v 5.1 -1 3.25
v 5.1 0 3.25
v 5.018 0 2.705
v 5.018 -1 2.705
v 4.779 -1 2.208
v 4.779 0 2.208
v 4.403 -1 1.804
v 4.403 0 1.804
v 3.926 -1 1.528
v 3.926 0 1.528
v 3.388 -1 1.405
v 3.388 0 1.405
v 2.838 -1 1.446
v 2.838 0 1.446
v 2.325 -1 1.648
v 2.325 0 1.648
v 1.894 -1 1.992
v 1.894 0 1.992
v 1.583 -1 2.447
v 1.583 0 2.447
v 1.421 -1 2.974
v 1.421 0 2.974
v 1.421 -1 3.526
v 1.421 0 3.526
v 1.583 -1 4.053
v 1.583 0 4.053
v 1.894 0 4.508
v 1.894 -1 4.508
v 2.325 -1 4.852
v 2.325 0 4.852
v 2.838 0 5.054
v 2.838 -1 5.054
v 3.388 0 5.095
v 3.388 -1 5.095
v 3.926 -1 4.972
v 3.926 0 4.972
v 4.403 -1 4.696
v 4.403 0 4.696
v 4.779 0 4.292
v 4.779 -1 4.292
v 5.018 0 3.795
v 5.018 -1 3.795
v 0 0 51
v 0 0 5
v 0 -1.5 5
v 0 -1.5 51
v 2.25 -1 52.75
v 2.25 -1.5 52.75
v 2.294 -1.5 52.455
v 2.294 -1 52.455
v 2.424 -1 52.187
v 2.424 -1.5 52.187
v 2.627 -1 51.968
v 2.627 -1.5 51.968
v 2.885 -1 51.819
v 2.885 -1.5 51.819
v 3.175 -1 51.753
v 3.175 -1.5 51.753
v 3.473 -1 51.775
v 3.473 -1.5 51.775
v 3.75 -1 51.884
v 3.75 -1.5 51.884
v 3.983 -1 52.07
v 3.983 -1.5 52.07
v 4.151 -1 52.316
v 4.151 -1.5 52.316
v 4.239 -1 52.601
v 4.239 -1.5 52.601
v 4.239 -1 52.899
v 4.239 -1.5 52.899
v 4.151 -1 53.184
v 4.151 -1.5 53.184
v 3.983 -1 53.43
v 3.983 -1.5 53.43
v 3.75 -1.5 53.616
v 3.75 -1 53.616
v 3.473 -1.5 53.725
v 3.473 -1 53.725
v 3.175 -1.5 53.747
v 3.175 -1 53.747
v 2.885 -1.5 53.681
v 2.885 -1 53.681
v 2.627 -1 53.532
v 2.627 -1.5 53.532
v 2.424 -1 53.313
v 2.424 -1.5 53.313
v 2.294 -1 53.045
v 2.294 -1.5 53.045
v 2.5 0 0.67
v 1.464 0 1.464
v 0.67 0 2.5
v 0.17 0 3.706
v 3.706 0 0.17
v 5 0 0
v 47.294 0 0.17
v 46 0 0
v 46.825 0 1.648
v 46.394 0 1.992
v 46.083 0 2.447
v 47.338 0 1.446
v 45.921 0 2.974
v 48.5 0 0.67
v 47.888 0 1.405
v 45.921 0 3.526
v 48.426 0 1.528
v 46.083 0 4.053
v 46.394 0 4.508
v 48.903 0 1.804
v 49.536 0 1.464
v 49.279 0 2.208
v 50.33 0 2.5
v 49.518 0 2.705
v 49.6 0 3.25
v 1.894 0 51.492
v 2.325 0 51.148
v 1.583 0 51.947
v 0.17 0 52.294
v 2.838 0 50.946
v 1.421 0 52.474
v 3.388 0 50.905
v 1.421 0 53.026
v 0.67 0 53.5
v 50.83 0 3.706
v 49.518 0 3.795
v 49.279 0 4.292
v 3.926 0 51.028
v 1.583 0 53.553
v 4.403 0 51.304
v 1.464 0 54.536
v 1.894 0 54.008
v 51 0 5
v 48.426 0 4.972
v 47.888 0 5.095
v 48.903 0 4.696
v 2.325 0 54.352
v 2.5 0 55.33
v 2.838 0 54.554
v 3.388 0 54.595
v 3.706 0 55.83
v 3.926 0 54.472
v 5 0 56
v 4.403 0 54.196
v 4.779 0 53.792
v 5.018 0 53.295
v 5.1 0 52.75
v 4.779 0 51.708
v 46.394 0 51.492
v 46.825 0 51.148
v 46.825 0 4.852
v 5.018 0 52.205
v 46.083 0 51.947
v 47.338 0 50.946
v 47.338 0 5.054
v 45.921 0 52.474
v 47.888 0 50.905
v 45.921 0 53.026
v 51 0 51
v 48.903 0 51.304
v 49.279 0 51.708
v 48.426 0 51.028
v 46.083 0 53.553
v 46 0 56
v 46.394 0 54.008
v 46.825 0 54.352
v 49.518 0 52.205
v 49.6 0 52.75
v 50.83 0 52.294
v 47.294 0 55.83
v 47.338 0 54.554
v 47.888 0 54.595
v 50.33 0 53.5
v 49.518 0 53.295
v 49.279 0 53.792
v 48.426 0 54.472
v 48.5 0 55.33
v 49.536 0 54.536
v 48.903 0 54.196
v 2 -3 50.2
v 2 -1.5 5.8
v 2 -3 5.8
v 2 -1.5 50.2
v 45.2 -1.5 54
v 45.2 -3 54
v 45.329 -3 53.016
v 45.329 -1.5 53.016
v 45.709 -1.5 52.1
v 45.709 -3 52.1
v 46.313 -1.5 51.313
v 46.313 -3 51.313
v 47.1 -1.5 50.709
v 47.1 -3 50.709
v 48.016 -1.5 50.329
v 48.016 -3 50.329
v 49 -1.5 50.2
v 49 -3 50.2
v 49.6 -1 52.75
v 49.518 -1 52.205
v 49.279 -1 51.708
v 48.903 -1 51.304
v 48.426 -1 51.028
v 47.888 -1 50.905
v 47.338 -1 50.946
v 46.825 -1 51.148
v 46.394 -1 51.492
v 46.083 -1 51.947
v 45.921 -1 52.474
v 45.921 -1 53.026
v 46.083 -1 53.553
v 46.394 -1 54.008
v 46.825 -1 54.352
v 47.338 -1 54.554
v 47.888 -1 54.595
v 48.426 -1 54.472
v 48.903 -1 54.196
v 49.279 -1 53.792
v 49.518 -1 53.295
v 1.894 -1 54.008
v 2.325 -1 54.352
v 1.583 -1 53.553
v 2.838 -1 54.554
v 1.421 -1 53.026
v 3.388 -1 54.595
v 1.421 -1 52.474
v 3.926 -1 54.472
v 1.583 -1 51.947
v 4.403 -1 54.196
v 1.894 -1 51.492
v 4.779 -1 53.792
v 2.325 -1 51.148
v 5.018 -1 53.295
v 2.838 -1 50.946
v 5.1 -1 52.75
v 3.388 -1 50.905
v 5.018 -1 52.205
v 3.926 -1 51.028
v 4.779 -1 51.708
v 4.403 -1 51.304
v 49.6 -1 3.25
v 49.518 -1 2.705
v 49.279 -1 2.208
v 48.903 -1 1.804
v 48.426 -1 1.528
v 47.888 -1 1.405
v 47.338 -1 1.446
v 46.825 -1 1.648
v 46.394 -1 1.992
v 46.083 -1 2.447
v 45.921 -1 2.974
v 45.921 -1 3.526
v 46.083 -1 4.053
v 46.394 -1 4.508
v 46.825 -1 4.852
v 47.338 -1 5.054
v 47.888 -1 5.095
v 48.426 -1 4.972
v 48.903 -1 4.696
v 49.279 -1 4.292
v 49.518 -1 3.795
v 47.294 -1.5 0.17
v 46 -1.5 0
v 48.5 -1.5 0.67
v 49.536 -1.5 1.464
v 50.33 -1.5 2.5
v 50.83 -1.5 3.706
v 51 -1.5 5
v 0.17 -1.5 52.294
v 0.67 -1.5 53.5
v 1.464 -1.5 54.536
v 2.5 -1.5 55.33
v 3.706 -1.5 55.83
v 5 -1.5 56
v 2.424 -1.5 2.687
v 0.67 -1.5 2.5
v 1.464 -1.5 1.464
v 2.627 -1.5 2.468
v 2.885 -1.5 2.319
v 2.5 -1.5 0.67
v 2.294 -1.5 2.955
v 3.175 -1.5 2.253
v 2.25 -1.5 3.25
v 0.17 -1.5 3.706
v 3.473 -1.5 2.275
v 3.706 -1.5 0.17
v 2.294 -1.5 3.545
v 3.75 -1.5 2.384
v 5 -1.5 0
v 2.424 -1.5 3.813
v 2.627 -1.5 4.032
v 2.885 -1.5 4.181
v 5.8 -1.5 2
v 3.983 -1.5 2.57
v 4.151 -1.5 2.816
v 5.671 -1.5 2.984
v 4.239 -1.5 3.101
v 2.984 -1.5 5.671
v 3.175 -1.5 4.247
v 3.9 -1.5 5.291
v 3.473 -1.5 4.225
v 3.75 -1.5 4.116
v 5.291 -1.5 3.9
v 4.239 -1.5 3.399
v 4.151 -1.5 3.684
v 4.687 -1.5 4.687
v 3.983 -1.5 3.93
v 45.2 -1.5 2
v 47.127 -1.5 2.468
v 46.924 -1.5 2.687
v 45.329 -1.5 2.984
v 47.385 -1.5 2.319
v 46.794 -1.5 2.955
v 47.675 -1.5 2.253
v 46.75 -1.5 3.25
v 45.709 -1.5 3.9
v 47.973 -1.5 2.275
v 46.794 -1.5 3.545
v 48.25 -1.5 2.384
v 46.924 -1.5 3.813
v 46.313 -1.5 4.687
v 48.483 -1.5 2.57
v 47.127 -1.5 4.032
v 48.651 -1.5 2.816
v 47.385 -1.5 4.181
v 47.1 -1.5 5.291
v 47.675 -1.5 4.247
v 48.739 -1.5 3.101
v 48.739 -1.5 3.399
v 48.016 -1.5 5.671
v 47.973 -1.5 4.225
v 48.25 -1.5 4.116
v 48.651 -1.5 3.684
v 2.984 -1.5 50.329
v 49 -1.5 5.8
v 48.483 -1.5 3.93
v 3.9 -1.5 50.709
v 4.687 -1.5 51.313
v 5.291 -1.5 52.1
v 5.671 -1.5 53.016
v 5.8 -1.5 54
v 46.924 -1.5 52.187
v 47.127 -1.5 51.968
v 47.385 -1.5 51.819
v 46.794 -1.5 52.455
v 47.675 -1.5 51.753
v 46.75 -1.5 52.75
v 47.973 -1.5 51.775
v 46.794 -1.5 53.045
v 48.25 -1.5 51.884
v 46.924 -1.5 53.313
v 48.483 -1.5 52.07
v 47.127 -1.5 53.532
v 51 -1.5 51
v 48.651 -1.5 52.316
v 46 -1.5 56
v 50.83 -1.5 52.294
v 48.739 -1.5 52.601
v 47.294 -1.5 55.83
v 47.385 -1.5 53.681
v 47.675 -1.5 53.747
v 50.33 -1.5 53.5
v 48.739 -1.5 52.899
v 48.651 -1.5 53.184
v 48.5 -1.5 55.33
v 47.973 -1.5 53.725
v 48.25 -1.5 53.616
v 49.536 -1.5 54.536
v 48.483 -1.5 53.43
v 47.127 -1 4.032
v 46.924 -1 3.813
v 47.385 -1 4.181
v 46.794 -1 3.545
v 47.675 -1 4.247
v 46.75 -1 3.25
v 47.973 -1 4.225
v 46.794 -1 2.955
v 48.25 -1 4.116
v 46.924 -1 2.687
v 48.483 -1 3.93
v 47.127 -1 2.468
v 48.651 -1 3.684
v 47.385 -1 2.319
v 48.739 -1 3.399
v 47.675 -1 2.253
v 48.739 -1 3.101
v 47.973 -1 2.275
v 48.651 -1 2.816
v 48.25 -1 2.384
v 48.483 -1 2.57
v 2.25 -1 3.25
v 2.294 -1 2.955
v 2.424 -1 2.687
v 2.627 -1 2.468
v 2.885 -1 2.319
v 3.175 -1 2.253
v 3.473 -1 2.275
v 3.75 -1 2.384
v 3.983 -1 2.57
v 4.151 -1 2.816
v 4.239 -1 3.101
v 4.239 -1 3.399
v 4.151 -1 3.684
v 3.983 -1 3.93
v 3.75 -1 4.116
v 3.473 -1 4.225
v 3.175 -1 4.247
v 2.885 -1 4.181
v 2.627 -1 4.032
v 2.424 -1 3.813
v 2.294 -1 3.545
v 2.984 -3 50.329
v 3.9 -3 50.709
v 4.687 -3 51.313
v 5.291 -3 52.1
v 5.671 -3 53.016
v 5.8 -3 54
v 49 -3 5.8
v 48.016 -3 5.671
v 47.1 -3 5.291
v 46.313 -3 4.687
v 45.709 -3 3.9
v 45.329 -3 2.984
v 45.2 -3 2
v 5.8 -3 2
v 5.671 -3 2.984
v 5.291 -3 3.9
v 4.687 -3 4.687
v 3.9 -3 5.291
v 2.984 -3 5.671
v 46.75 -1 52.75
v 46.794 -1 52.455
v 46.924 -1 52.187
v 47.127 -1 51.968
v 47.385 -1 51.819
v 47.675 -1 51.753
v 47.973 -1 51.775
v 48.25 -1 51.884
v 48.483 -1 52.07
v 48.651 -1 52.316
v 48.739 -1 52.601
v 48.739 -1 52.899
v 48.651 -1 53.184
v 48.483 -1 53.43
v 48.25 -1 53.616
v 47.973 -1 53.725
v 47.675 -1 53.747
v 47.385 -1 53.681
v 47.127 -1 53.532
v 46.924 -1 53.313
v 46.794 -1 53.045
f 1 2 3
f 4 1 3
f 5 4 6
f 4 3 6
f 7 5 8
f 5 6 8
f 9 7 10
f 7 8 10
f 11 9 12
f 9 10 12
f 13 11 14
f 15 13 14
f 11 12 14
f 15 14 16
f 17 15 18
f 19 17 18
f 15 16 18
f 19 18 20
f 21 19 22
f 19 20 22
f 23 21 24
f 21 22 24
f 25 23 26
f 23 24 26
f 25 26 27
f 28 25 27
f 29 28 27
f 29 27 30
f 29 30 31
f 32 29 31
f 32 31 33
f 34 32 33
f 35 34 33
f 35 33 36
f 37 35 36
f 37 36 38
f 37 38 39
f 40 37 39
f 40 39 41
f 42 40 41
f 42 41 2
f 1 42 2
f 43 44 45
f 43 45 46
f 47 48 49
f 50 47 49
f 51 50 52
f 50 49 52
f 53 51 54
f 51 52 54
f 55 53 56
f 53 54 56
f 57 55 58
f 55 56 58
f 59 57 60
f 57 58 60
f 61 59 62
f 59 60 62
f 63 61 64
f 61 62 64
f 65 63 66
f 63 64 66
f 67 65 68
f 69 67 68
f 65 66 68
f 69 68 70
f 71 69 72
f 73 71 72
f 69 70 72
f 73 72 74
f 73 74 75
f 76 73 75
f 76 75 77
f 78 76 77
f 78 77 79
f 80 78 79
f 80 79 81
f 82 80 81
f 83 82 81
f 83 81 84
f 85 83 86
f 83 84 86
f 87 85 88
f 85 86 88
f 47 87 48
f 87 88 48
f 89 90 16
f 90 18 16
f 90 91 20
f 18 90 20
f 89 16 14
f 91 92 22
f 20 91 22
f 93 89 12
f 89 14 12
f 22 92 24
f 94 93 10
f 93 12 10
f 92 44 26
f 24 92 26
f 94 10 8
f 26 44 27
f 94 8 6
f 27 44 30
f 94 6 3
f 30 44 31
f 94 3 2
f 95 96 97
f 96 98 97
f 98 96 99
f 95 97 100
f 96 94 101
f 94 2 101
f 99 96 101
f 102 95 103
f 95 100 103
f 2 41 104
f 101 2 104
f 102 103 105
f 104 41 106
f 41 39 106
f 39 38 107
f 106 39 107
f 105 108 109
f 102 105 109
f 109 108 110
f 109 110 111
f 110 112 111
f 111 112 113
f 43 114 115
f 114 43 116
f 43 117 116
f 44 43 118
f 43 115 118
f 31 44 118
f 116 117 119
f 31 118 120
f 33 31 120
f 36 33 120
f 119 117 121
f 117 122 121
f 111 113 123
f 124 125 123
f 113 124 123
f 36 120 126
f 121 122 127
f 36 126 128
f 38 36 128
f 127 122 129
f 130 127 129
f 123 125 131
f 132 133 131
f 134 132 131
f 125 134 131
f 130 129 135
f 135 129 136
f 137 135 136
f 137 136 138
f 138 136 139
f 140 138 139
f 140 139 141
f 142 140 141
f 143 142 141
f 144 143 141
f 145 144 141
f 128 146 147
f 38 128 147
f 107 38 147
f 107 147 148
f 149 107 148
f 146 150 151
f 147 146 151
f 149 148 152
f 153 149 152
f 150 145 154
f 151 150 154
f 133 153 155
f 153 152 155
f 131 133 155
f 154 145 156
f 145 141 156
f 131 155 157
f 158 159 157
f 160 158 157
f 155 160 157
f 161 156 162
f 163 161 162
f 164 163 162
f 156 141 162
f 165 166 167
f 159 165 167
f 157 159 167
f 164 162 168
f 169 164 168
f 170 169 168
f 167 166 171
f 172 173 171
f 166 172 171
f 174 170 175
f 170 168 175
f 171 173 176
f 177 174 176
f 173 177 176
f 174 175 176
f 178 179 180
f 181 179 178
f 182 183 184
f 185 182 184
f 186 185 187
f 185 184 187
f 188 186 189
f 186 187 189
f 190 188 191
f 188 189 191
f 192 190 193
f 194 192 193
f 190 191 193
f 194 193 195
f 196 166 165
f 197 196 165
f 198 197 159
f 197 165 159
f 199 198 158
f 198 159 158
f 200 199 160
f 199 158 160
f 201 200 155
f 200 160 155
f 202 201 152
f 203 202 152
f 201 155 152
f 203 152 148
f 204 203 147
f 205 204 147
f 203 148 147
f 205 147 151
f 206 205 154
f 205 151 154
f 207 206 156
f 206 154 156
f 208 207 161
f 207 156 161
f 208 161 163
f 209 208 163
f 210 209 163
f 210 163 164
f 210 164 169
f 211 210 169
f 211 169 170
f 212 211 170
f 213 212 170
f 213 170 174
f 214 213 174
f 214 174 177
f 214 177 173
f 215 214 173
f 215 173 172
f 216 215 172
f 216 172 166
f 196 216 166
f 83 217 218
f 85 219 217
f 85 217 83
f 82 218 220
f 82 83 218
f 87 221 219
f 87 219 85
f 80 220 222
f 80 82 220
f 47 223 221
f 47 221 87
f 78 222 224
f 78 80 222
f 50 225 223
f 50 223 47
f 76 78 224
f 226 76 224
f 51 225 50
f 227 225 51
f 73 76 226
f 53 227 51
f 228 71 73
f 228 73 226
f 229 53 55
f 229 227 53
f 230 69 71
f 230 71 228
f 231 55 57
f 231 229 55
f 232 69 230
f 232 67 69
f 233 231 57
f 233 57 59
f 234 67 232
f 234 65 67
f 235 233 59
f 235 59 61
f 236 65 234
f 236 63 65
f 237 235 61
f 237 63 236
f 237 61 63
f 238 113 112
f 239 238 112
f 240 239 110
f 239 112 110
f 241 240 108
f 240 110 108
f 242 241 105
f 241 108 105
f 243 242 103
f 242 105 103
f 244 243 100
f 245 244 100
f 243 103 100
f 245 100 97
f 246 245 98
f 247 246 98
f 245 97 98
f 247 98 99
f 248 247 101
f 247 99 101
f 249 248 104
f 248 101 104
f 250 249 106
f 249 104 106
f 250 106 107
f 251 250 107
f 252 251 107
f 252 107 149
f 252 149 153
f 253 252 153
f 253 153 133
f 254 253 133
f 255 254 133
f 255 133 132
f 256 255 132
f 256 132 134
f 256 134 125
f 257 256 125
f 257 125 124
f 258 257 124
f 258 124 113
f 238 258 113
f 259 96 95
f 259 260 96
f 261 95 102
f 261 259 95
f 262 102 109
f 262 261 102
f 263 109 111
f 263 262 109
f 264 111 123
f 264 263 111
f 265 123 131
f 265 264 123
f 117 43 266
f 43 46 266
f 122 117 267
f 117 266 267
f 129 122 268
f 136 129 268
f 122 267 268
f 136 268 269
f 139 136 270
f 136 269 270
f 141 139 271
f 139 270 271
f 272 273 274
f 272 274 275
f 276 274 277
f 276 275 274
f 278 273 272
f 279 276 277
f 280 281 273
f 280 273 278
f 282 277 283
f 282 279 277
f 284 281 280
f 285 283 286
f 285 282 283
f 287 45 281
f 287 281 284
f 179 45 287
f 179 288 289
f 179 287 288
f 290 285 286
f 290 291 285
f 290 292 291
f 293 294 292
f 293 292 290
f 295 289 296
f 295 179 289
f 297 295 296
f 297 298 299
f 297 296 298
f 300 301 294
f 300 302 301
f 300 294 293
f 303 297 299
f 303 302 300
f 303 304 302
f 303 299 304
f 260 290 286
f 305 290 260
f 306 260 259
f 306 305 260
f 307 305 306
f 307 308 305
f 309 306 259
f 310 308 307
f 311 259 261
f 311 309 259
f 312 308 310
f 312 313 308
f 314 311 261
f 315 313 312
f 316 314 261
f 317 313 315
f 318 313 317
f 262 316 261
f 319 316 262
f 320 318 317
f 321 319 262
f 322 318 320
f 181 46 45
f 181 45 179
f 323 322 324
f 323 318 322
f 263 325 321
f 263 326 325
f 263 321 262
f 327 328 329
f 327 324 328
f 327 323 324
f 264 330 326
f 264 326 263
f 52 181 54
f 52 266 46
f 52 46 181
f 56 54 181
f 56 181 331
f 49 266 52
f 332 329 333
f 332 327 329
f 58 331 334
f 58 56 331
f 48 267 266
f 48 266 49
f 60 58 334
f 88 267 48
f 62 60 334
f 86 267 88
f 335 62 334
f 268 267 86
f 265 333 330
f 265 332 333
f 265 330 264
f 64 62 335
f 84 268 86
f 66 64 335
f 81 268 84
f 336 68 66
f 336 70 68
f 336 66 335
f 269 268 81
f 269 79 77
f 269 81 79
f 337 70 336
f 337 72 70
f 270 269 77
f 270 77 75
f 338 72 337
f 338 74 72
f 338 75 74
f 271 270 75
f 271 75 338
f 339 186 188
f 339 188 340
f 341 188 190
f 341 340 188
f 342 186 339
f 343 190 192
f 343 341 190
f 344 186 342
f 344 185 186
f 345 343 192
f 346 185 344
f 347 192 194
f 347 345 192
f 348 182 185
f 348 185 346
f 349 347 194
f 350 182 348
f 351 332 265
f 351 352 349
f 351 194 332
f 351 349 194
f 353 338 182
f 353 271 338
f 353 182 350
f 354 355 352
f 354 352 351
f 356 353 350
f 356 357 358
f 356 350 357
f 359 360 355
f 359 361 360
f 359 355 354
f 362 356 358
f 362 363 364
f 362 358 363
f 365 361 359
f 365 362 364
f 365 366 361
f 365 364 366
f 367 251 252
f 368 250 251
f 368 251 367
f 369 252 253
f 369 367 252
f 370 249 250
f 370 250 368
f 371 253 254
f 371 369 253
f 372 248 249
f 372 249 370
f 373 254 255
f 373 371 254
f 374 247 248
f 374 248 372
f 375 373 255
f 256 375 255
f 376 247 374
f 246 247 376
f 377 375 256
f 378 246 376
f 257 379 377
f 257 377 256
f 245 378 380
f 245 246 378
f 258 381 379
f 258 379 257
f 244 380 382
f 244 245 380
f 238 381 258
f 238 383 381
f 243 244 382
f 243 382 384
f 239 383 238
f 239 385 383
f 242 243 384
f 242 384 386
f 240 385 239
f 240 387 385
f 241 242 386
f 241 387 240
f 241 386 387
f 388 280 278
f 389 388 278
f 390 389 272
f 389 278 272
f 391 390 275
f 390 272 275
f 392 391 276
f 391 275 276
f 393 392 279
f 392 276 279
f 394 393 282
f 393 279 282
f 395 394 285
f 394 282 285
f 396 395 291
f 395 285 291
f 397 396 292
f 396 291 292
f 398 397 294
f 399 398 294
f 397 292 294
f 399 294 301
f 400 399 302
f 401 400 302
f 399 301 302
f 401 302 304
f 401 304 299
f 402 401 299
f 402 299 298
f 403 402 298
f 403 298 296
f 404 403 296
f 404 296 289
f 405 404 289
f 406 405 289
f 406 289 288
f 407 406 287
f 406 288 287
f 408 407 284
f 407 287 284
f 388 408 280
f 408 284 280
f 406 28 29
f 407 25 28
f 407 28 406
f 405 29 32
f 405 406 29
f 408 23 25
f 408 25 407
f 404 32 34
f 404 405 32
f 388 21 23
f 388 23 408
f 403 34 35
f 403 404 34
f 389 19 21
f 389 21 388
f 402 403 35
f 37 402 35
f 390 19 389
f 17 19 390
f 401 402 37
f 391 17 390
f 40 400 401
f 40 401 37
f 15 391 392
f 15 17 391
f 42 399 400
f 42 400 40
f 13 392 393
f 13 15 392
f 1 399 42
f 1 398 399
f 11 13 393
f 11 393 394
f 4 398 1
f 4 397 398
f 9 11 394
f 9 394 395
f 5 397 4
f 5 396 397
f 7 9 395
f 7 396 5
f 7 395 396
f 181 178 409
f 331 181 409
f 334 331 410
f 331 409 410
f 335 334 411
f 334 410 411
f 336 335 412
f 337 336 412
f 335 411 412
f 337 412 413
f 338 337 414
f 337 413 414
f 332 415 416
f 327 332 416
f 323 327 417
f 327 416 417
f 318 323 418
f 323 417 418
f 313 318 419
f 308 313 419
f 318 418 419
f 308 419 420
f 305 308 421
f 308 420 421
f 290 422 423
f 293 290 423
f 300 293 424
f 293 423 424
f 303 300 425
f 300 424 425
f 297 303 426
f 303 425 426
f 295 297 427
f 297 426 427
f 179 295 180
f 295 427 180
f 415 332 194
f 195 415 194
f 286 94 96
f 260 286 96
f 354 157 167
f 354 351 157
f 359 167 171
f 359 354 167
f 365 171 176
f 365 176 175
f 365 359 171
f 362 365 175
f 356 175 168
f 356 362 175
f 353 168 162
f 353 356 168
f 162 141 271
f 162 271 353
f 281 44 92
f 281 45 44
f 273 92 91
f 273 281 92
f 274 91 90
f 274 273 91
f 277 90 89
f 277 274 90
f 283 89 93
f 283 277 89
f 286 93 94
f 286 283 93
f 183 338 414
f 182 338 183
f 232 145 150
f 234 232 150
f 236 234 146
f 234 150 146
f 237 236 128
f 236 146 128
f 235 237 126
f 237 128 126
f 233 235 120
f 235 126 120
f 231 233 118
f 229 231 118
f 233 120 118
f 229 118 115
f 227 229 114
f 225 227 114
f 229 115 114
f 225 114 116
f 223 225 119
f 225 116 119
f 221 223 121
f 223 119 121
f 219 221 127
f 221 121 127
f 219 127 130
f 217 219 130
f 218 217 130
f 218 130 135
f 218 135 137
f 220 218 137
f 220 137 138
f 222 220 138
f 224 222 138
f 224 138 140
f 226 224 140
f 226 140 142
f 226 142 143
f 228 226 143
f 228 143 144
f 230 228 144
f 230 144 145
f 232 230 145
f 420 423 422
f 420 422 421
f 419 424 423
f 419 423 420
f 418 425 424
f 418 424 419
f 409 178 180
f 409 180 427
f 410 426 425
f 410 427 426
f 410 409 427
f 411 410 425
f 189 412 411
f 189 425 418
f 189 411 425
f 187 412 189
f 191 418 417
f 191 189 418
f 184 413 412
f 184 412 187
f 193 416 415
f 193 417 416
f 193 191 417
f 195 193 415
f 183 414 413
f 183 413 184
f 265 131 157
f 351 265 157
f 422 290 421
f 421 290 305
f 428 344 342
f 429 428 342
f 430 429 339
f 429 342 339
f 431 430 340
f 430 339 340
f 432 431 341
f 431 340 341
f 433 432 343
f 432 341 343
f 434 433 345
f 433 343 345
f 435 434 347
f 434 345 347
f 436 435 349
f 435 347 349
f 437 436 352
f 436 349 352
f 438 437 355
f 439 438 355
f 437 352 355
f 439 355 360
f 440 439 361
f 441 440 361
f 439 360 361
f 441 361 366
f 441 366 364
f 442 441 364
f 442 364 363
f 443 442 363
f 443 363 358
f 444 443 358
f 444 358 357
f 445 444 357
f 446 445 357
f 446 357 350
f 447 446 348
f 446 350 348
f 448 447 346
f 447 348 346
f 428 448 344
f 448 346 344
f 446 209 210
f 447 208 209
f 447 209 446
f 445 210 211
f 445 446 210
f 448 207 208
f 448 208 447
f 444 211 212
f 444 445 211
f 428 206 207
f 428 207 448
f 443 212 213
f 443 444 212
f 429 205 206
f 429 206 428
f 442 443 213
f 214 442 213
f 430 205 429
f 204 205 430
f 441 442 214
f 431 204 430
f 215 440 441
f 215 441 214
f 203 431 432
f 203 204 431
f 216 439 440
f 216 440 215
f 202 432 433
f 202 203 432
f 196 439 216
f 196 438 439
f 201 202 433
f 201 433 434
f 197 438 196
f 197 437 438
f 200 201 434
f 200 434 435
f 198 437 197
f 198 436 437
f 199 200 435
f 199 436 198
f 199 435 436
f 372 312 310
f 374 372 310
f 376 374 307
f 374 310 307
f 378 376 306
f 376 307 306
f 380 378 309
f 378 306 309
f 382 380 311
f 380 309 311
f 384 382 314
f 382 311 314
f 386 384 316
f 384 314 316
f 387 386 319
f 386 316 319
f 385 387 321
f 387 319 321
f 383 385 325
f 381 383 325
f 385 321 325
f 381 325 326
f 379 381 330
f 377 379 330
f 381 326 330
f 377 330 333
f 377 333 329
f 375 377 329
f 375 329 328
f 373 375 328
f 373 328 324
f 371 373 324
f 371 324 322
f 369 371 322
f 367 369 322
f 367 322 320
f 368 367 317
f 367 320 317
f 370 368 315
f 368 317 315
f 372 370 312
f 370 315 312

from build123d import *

# Parameters (mm, degrees)
F0_W           = 51
F0_H           = 56
F0_W_2         = 47
F0_H_2         = 52
F1_DEPTH       = 1.5
F2_R           = 5
F3_DEPTH       = 3
F5_D           = 2
F5_CBORE_D     = 3.7
F5_CBORE_DEPTH = 1
F7_DEPTH       = 1.5


with BuildPart() as f1:
    # F0 (on Front) → F1 (new body)
    with BuildSketch(Plane.XZ):
        with Locations((25.5, 28)):
            Rectangle(F0_W, F0_H)
        with Locations((25.5, 28)):
            Rectangle(F0_W_2, F0_H_2, mode=Mode.SUBTRACT)
        with Locations((25.5, 28)):
            Rectangle(F0_W_2, F0_H_2)
    extrude(amount=F1_DEPTH)

    # F2
    f2_edges = [f1.edges().sort_by_distance(p)[0] for p in [
        (0, -0.75, 56),
        (51, -0.75, 56),
        (51, -0.75, 0),
        (0, -0.75, 0),
    ]]
    fillet(f2_edges, radius=F2_R)

    # F0 (on Front) → F3 (join)
    with BuildSketch(Plane.XZ):
        with Locations((25.5, 28)):
            Rectangle(F0_W_2, F0_H_2)
    extrude(amount=F3_DEPTH)

    # F5 (through all)
    with Locations(Plane(origin=(0, 0, 0), x_dir=(1, 0, 0), z_dir=(0, 1, 0))):
        with Locations((47.75, -52.75), (3.25, -52.75), (47.75, -3.25), (3.25, -3.25)):
            CounterBoreHole(F5_D / 2, F5_CBORE_D / 2, F5_CBORE_DEPTH)

    # F6 (on face) → F7 (cut)
    with BuildSketch(Plane.XZ.offset(3)):
        with BuildLine():
            Line((2, 54), (2, 50.2))
            ThreePointArc((2, 50.2), (4.6870057685, 51.3129942315), (5.8, 54))
            Line((5.8, 54), (2, 54))
        make_face()
        with BuildLine():
            ThreePointArc((45.2, 54), (46.3129942315, 51.3129942315), (49, 50.2))
            Line((49, 50.2), (49, 54))
            Line((49, 54), (45.2, 54))
        make_face()
        with BuildLine():
            Line((49, 2), (49, 5.8))
            ThreePointArc((49, 5.8), (46.3129942315, 4.6870057685), (45.2, 2))
            Line((45.2, 2), (49, 2))
        make_face()
        with BuildLine():
            ThreePointArc((5.8, 2), (4.6870057685, 4.6870057685), (2, 5.8))
            Line((2, 5.8), (2, 2))
            Line((2, 2), (5.8, 2))
        make_face()
    extrude(amount=-F7_DEPTH, mode=Mode.SUBTRACT)


solid = f1.part
